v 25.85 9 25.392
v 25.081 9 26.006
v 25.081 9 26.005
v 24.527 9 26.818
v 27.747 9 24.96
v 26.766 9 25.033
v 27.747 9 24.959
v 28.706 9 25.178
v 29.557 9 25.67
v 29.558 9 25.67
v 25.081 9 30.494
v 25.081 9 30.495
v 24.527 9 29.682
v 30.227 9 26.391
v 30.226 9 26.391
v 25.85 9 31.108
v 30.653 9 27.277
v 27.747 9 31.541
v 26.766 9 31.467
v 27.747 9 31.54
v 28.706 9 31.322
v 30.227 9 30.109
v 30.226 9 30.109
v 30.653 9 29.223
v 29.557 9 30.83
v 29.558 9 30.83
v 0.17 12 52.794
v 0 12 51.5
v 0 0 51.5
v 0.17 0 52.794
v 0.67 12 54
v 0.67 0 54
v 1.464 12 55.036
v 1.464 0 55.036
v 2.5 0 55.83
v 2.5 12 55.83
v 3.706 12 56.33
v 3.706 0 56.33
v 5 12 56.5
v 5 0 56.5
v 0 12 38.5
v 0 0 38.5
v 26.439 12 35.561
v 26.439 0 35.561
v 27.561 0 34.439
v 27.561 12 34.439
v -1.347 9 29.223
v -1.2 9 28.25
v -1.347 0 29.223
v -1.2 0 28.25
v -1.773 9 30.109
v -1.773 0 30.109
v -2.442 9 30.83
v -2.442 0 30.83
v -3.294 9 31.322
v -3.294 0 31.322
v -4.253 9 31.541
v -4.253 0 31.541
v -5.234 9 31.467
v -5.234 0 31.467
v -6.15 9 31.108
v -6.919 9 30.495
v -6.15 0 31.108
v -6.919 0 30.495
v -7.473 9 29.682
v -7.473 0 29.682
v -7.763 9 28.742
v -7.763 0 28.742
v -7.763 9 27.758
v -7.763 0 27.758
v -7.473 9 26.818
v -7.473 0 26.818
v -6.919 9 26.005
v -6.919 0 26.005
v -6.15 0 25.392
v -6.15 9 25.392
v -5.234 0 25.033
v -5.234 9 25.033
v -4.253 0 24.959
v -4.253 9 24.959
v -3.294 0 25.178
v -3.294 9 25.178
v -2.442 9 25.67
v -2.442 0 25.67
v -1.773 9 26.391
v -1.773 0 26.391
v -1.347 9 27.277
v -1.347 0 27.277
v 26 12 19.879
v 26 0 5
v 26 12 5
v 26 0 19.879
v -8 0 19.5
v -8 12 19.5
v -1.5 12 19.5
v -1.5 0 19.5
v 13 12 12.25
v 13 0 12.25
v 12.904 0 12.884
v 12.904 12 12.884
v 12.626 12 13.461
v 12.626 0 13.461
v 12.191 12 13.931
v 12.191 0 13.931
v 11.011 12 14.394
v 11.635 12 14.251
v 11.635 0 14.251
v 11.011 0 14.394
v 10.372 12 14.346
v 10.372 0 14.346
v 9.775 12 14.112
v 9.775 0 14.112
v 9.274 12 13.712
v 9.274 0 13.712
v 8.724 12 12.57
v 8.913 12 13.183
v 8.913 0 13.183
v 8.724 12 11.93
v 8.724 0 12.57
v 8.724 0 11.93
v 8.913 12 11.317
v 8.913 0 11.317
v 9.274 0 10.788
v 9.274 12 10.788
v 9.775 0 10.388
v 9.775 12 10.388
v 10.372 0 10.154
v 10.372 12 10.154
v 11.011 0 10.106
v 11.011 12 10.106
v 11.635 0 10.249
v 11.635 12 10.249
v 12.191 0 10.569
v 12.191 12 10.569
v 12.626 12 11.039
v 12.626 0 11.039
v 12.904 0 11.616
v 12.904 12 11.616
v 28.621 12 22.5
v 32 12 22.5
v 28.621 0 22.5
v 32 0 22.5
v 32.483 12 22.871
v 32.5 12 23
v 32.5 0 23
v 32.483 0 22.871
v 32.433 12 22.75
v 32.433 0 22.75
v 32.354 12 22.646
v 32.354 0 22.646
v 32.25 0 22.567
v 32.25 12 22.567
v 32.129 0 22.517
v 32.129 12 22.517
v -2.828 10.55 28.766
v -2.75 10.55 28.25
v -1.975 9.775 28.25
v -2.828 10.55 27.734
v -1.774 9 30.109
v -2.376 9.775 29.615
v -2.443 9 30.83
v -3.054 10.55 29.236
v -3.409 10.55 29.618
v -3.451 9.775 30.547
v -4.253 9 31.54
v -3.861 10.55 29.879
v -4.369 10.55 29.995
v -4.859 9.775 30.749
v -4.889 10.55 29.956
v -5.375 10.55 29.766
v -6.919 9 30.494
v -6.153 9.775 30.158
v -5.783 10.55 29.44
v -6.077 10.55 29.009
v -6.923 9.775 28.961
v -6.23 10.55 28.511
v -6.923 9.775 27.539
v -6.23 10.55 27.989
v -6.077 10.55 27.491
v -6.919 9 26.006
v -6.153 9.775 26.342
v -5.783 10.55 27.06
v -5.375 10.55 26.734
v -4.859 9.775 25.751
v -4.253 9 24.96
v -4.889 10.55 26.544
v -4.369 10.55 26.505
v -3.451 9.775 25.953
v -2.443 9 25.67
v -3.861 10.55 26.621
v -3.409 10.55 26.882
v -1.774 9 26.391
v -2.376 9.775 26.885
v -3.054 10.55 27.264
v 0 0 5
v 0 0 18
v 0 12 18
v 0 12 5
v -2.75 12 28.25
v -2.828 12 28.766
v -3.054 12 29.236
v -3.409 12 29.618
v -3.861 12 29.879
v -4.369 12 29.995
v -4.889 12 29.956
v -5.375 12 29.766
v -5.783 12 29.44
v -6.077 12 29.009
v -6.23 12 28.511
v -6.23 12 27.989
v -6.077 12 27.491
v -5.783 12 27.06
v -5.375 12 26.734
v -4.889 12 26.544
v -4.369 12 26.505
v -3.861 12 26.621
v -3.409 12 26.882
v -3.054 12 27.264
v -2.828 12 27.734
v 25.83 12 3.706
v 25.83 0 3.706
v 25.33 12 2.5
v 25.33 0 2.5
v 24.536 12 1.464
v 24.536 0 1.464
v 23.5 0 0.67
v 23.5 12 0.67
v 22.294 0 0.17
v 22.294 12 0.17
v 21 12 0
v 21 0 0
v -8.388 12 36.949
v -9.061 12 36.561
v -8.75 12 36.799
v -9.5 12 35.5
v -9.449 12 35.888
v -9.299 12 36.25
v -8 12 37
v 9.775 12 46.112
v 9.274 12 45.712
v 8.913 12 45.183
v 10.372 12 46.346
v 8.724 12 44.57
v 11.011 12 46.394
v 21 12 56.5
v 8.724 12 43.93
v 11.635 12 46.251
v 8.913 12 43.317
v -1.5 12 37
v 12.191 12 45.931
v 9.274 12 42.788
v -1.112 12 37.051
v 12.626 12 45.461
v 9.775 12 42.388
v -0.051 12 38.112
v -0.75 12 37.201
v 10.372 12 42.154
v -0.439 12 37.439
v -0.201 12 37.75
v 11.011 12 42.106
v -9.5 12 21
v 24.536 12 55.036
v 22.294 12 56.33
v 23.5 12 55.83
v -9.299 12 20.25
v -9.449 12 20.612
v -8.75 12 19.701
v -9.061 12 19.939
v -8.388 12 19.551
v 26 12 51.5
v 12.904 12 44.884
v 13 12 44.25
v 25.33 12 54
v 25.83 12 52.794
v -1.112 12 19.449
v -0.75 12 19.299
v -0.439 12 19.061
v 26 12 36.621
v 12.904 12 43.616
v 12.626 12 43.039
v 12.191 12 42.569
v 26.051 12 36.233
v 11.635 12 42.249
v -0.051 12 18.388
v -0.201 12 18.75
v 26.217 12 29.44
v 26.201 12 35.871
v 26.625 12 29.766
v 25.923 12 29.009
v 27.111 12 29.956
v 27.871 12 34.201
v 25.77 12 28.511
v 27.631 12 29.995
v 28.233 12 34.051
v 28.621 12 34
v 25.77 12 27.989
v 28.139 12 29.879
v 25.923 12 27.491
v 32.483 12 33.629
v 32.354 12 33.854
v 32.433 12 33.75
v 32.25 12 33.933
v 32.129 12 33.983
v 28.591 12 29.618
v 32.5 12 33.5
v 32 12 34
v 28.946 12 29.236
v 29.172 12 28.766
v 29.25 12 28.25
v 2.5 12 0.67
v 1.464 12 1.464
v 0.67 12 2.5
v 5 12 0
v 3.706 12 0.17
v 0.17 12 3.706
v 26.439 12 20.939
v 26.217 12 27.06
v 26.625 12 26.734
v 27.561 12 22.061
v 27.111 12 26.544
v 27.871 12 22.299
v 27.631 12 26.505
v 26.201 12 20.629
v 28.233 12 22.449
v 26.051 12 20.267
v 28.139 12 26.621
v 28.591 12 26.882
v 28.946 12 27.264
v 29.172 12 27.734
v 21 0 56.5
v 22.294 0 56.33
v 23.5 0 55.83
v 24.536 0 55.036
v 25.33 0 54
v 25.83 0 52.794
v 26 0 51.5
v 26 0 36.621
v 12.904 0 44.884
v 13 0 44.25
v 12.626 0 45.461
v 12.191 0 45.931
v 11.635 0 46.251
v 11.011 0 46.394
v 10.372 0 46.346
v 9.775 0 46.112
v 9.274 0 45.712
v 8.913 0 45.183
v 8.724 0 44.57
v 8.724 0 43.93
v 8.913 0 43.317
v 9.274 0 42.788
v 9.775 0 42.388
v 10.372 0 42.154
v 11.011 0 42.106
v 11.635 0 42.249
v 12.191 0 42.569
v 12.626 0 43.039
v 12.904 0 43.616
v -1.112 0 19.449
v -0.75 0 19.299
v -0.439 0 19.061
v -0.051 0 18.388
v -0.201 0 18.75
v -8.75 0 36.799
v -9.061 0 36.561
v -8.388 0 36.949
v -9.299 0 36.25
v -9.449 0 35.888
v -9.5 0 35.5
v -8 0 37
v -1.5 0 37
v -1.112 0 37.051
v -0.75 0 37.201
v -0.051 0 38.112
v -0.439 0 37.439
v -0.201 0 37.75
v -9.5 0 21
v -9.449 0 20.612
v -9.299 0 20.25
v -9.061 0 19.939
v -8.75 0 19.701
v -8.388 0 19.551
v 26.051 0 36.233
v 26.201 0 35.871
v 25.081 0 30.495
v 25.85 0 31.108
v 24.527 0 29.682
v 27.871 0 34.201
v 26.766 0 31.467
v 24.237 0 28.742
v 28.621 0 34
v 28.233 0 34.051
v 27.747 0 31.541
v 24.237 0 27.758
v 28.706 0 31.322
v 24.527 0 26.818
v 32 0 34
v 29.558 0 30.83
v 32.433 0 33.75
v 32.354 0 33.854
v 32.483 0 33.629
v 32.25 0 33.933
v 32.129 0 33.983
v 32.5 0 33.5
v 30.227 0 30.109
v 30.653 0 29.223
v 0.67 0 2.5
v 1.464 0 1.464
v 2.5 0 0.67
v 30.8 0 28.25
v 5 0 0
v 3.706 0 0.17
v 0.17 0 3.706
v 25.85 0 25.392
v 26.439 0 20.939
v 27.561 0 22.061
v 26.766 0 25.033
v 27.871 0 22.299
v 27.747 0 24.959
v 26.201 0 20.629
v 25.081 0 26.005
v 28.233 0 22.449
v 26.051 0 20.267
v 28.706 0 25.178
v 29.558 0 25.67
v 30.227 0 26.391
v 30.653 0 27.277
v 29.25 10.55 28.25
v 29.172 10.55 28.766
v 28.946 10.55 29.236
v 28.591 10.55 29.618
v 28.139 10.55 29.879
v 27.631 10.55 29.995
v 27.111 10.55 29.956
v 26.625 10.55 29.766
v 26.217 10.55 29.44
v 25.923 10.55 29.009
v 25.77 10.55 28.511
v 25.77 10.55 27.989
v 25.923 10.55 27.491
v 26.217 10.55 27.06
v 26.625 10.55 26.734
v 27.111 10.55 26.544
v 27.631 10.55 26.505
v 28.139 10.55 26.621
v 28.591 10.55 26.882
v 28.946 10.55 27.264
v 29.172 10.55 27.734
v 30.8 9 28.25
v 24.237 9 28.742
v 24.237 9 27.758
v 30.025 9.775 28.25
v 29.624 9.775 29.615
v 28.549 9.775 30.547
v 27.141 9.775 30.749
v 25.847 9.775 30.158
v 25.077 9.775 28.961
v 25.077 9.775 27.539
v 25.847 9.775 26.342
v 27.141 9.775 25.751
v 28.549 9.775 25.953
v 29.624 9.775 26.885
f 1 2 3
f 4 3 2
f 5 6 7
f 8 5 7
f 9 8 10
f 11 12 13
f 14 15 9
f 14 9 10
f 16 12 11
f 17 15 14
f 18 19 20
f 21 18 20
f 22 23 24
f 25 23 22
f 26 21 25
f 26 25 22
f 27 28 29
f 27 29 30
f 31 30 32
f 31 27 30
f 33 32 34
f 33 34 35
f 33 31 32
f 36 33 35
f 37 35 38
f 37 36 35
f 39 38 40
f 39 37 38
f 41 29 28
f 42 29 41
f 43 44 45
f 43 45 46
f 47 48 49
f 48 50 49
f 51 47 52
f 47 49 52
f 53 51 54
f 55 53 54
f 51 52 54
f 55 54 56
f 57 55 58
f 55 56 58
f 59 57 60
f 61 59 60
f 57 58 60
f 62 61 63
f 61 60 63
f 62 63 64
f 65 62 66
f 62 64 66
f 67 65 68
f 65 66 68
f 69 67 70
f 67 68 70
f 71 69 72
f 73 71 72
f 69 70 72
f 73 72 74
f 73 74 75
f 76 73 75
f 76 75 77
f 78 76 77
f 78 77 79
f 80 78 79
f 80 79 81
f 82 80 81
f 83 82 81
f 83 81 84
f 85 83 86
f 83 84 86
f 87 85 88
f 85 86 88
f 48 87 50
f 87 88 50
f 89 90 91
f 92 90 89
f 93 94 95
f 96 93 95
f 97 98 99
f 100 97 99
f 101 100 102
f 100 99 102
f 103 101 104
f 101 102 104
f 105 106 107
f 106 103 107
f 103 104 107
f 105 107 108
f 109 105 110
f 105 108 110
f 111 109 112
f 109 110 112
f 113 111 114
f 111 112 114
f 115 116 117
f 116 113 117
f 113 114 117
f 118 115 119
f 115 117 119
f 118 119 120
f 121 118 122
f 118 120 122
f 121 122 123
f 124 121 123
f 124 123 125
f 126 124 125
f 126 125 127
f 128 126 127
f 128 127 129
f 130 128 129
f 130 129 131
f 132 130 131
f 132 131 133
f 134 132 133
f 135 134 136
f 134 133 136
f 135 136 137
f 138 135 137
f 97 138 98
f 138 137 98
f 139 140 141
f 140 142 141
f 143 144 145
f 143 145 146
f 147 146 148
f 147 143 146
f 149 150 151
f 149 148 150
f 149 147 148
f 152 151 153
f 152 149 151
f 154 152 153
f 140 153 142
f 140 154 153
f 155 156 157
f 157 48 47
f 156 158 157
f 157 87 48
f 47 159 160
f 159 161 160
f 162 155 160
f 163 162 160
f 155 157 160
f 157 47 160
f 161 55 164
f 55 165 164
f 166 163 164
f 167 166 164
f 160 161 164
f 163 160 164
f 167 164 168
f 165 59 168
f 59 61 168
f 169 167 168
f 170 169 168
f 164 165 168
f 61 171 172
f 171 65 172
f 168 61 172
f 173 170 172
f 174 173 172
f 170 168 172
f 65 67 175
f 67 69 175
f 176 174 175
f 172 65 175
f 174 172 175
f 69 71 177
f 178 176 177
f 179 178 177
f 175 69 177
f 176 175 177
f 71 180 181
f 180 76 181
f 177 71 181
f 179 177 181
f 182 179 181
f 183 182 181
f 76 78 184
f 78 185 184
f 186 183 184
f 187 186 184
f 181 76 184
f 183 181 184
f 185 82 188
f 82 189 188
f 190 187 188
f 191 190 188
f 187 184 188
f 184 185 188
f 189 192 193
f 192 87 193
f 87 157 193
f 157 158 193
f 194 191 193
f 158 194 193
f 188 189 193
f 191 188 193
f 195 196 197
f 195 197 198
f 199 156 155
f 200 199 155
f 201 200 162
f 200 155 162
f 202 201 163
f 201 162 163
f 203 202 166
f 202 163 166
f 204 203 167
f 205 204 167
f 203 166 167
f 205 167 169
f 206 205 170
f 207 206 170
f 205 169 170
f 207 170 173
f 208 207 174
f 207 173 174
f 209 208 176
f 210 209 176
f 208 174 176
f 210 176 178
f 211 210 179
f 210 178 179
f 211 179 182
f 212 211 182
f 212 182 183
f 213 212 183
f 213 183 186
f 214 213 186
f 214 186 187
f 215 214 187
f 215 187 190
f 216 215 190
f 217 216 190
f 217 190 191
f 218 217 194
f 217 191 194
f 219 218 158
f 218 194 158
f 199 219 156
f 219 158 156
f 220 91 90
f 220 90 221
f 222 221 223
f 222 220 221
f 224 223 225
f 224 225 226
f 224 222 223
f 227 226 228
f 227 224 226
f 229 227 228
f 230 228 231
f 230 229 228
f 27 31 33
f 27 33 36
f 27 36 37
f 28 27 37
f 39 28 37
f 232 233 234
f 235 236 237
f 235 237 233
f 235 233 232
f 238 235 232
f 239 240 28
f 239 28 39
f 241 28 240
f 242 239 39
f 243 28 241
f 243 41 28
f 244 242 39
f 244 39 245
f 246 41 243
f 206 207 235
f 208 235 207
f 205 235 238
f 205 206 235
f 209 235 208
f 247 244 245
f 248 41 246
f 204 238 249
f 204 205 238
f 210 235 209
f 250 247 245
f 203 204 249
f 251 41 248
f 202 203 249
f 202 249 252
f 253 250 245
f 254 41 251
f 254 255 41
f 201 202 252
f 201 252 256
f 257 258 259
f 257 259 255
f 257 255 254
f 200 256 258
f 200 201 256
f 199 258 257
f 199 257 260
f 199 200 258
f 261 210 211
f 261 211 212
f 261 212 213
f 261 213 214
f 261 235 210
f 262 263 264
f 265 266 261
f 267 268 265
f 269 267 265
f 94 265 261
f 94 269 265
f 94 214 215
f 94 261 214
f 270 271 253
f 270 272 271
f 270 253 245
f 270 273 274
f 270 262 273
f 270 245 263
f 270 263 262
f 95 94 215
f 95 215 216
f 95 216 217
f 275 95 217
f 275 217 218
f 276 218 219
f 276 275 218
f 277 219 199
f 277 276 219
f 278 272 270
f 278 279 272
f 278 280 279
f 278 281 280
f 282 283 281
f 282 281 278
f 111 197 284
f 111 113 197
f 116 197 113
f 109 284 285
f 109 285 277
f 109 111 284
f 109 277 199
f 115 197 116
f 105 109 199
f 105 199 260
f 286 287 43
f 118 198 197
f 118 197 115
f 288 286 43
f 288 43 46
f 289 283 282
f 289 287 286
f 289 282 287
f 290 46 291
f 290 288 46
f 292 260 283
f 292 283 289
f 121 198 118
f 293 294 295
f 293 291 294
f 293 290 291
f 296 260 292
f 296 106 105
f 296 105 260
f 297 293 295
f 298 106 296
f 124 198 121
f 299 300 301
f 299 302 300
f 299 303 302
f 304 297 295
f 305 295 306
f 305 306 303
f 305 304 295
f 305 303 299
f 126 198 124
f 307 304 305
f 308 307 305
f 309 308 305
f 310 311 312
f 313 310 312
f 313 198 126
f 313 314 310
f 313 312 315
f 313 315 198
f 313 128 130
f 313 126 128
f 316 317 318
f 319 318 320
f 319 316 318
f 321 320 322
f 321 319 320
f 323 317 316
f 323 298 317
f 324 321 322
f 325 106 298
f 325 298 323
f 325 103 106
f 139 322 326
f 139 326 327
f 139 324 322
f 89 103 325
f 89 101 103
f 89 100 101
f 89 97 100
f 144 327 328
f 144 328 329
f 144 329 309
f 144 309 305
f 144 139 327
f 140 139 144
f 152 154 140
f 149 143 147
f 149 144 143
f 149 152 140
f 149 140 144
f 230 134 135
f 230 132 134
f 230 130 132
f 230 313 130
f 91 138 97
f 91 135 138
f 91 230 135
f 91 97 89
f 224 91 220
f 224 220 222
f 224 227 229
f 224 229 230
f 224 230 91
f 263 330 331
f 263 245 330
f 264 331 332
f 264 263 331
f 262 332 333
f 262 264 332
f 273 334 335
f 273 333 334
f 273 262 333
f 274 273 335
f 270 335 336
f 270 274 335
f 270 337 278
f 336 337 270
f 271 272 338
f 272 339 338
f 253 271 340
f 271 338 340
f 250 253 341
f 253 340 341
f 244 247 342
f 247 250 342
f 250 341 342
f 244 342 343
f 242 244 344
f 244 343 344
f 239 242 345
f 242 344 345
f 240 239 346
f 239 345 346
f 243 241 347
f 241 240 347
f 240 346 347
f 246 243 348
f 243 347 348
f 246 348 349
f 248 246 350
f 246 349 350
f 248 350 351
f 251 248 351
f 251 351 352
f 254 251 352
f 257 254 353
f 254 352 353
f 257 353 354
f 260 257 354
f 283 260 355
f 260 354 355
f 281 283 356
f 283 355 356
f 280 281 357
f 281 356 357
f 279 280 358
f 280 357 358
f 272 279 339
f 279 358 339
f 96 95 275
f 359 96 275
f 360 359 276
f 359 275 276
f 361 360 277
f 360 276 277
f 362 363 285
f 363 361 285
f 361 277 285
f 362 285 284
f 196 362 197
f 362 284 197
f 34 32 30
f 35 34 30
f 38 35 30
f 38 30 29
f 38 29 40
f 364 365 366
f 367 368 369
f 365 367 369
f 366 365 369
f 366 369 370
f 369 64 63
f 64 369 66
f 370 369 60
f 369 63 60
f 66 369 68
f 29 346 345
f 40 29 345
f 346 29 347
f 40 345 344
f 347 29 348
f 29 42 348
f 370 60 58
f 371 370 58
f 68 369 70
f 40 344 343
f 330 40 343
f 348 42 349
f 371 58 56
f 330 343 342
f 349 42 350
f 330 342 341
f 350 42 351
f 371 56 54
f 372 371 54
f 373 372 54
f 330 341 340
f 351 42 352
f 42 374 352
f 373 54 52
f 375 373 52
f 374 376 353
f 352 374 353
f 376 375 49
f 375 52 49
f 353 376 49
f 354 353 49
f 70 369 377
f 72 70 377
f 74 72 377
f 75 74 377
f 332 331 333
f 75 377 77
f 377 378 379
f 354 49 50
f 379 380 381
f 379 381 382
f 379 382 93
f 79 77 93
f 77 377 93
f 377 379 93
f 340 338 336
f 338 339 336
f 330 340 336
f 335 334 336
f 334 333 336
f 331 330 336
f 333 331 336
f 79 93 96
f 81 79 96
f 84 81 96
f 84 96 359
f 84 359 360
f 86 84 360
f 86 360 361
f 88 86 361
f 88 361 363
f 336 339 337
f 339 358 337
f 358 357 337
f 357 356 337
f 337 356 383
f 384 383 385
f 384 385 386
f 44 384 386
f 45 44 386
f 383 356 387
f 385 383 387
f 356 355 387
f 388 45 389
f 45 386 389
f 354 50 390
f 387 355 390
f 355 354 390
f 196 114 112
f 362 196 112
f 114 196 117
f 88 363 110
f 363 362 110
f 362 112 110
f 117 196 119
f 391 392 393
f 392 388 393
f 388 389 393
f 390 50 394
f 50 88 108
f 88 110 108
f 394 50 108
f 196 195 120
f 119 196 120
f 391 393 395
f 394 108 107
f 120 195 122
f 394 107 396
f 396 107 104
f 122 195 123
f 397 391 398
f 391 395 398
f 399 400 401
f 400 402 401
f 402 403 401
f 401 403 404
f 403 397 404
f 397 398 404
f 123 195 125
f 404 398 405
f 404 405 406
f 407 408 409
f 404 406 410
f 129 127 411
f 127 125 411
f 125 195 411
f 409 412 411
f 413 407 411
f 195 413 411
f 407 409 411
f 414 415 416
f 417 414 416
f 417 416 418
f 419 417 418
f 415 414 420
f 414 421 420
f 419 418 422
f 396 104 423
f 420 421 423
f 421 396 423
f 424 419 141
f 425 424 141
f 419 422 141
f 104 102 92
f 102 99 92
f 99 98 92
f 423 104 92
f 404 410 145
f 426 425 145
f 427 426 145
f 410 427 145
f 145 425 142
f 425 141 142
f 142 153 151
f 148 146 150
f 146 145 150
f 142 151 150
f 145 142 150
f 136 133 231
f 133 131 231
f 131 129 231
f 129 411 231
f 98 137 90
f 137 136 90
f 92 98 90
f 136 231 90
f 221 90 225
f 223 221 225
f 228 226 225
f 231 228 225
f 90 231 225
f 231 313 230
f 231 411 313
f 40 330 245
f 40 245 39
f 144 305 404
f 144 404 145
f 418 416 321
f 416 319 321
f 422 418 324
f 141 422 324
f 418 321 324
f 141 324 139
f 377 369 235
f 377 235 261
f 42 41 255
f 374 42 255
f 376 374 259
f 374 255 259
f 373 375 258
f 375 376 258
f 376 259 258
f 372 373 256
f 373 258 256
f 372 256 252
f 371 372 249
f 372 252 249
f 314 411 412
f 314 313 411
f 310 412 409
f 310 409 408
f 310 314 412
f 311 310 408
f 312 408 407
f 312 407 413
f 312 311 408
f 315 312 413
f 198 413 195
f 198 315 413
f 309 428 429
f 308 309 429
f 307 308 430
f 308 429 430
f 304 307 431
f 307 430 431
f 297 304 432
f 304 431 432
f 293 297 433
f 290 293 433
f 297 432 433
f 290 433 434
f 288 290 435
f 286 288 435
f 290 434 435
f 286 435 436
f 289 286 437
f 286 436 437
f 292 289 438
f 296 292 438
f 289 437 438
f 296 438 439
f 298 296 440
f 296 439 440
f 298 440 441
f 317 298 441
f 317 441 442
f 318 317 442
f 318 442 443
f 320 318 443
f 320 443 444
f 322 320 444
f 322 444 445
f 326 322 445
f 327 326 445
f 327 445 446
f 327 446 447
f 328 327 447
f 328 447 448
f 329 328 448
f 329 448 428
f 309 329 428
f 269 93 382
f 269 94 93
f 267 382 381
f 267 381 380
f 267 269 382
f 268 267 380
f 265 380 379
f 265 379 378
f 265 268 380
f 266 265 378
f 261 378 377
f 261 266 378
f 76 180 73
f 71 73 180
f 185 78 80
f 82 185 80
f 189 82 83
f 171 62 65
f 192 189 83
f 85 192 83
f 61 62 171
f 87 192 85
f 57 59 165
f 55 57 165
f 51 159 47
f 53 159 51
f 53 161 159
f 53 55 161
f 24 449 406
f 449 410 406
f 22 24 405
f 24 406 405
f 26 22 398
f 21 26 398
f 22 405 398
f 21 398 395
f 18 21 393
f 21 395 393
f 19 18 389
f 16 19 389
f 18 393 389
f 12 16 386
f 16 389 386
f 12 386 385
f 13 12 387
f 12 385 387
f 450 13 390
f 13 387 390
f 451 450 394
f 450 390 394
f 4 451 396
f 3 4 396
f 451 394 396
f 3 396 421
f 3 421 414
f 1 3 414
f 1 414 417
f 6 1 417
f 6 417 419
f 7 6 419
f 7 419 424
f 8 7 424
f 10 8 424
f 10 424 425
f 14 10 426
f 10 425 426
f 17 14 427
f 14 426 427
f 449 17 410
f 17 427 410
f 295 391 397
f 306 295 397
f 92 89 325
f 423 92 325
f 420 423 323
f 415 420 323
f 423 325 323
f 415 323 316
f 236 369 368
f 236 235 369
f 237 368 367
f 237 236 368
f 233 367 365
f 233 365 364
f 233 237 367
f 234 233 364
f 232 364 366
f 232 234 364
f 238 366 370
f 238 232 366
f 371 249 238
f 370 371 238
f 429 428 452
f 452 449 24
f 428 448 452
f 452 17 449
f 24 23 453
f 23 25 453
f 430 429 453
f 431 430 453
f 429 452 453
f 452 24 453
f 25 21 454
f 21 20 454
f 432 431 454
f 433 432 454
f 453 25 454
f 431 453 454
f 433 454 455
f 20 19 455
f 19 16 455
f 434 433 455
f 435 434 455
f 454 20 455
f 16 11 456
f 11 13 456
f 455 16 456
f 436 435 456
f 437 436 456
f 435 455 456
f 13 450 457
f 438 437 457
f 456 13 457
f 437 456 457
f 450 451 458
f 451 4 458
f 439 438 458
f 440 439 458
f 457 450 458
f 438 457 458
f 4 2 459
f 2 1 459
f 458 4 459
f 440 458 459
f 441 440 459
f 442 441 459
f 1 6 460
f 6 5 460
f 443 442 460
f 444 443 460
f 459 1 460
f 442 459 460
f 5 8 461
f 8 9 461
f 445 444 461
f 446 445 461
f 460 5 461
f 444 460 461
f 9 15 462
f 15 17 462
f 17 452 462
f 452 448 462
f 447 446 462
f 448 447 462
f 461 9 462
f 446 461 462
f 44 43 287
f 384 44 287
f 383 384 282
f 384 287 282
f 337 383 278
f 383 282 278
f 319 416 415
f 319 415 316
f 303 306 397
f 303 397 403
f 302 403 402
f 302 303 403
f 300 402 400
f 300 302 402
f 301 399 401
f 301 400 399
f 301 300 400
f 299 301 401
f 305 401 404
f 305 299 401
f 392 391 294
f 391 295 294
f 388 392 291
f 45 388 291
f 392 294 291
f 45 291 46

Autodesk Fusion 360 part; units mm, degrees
sketch "Sketch1" plane through (0, 0, 0) normal (0, 1, 0) x (1, 0, 0)
  line L0 (0, 0) -> (26, 0)
  line L1 (26, 0) -> (26, -56.5)
  line L2 (26, -56.5) -> (0, -56.5)
  line L3 (0, -56.5) -> (0, 0)
  line L4 (0, -37) -> (-9.5, -37)
  line L5 (-9.5, -37) -> (-9.5, -19.5)
  line L6 (-9.5, -19.5) -> (0, -19.5)
  line L7 (-9.5, -28.25) -> (0, -28.25) construction
  line L8 (26, -34) -> (32.5, -34)
  line L9 (32.5, -34) -> (32.5, -22.5)
  line L10 (32.5, -22.5) -> (26, -22.5)
  line L11 (26, -28.25) -> (32.5, -28.25) construction
  circle A0 centre (10.85, -44.25) radius 2.15
  circle A1 centre (10.85, -12.25) radius 2.15
  line L12 (10.85, -44.25) -> (10.85, -12.25) construction
  line L13 (0, -28.25) -> (10.85, -28.25) construction
  line L14 (8.7, -44.25) -> (10.85, -44.25) construction
  point P0 (8.7, -44.25)
  dimension "d2" = 26
  dimension "d3" = 56.5
  dimension "d4" = 9.5
  dimension "d5" = 17.5
  dimension "d6" = 6.5
  dimension "d7" = 11.5
  dimension "d8" = 32
  dimension "d9" = 4.3
  dimension "d10" = 8.7
extrude "Extrude1" add sketch "Sketch1" along normal blind 12
sketch "Sketch2" plane through (0, 0, 0) normal (0, -1, 0) x (1, 0, 0)
  circle A0 centre (10.85, 12.25) radius 2.15
  circle A1 centre (10.85, 44.25) radius 2.15
  line L0 (32.5, 34) -> (26, 34)
  line L1 (26, 34) -> (26, 56.5)
  line L2 (26, 56.5) -> (0, 56.5)
  line L3 (0, 56.5) -> (0, 37)
  line L4 (0, 37) -> (-9.5, 37)
  line L5 (-9.5, 37) -> (-9.5, 19.5)
  line L6 (-9.5, 19.5) -> (0, 19.5)
  line L7 (0, 19.5) -> (0, 0)
  line L8 (0, 0) -> (26, 0)
  line L9 (26, 0) -> (26, 22.5)
  line L10 (26, 22.5) -> (32.5, 22.5)
  line L11 (32.5, 22.5) -> (32.5, 34)
  line L12 (-9.5, 28.25) -> (32.5, 28.25) construction
  circle A2 centre (-4.5, 28.25) radius 3.3
  circle A3 centre (-4.5, 28.25) radius 1.75
  circle A4 centre (27.5, 28.25) radius 1.75
  circle A5 centre (27.5, 28.25) radius 3.3
  dimension "d20" = 3.5
  dimension "d21" = 6.6
  dimension "d22" = 5
  dimension "d23" = 5
extrude "Extrude2" cut sketch "Sketch2" against normal up to surface (12 mm away) contours A3 | A4
extrude "Extrude3" cut sketch "Sketch2" against normal up to surface (9 mm away) contours A2 | A5
chamfer "Chamfer2" distance 1.55 angle 45 2 edges at (-6.1316, 9, 27.6172) (25.8684, 9, 27.6172)
chamfer "Chamfer1" distance 2 angle 45 2 edges at (26, 6, 34) (26, 6, 22.5)
fillet "Fillet1" radius 1.5 8 edges at (0, 6, 37) (0, 6, 19.5) (26, 6, 36) (28, 6, 34) (26, 6, 20.5) (28, 6, 22.5) (-9.5, 6, 37) (-9.5, 6, 19.5)
fillet "Fillet2" radius 5 4 edges at (26, 6, 0) (0, 6, 56.5) (26, 6, 56.5) (0, 6, 0)
fillet "Fillet3" radius 0.5 2 edges at (32.5, 6, 34) (32.5, 6, 22.5)
equation "d11 = thickness"
equation "thickness = 12 mm"
